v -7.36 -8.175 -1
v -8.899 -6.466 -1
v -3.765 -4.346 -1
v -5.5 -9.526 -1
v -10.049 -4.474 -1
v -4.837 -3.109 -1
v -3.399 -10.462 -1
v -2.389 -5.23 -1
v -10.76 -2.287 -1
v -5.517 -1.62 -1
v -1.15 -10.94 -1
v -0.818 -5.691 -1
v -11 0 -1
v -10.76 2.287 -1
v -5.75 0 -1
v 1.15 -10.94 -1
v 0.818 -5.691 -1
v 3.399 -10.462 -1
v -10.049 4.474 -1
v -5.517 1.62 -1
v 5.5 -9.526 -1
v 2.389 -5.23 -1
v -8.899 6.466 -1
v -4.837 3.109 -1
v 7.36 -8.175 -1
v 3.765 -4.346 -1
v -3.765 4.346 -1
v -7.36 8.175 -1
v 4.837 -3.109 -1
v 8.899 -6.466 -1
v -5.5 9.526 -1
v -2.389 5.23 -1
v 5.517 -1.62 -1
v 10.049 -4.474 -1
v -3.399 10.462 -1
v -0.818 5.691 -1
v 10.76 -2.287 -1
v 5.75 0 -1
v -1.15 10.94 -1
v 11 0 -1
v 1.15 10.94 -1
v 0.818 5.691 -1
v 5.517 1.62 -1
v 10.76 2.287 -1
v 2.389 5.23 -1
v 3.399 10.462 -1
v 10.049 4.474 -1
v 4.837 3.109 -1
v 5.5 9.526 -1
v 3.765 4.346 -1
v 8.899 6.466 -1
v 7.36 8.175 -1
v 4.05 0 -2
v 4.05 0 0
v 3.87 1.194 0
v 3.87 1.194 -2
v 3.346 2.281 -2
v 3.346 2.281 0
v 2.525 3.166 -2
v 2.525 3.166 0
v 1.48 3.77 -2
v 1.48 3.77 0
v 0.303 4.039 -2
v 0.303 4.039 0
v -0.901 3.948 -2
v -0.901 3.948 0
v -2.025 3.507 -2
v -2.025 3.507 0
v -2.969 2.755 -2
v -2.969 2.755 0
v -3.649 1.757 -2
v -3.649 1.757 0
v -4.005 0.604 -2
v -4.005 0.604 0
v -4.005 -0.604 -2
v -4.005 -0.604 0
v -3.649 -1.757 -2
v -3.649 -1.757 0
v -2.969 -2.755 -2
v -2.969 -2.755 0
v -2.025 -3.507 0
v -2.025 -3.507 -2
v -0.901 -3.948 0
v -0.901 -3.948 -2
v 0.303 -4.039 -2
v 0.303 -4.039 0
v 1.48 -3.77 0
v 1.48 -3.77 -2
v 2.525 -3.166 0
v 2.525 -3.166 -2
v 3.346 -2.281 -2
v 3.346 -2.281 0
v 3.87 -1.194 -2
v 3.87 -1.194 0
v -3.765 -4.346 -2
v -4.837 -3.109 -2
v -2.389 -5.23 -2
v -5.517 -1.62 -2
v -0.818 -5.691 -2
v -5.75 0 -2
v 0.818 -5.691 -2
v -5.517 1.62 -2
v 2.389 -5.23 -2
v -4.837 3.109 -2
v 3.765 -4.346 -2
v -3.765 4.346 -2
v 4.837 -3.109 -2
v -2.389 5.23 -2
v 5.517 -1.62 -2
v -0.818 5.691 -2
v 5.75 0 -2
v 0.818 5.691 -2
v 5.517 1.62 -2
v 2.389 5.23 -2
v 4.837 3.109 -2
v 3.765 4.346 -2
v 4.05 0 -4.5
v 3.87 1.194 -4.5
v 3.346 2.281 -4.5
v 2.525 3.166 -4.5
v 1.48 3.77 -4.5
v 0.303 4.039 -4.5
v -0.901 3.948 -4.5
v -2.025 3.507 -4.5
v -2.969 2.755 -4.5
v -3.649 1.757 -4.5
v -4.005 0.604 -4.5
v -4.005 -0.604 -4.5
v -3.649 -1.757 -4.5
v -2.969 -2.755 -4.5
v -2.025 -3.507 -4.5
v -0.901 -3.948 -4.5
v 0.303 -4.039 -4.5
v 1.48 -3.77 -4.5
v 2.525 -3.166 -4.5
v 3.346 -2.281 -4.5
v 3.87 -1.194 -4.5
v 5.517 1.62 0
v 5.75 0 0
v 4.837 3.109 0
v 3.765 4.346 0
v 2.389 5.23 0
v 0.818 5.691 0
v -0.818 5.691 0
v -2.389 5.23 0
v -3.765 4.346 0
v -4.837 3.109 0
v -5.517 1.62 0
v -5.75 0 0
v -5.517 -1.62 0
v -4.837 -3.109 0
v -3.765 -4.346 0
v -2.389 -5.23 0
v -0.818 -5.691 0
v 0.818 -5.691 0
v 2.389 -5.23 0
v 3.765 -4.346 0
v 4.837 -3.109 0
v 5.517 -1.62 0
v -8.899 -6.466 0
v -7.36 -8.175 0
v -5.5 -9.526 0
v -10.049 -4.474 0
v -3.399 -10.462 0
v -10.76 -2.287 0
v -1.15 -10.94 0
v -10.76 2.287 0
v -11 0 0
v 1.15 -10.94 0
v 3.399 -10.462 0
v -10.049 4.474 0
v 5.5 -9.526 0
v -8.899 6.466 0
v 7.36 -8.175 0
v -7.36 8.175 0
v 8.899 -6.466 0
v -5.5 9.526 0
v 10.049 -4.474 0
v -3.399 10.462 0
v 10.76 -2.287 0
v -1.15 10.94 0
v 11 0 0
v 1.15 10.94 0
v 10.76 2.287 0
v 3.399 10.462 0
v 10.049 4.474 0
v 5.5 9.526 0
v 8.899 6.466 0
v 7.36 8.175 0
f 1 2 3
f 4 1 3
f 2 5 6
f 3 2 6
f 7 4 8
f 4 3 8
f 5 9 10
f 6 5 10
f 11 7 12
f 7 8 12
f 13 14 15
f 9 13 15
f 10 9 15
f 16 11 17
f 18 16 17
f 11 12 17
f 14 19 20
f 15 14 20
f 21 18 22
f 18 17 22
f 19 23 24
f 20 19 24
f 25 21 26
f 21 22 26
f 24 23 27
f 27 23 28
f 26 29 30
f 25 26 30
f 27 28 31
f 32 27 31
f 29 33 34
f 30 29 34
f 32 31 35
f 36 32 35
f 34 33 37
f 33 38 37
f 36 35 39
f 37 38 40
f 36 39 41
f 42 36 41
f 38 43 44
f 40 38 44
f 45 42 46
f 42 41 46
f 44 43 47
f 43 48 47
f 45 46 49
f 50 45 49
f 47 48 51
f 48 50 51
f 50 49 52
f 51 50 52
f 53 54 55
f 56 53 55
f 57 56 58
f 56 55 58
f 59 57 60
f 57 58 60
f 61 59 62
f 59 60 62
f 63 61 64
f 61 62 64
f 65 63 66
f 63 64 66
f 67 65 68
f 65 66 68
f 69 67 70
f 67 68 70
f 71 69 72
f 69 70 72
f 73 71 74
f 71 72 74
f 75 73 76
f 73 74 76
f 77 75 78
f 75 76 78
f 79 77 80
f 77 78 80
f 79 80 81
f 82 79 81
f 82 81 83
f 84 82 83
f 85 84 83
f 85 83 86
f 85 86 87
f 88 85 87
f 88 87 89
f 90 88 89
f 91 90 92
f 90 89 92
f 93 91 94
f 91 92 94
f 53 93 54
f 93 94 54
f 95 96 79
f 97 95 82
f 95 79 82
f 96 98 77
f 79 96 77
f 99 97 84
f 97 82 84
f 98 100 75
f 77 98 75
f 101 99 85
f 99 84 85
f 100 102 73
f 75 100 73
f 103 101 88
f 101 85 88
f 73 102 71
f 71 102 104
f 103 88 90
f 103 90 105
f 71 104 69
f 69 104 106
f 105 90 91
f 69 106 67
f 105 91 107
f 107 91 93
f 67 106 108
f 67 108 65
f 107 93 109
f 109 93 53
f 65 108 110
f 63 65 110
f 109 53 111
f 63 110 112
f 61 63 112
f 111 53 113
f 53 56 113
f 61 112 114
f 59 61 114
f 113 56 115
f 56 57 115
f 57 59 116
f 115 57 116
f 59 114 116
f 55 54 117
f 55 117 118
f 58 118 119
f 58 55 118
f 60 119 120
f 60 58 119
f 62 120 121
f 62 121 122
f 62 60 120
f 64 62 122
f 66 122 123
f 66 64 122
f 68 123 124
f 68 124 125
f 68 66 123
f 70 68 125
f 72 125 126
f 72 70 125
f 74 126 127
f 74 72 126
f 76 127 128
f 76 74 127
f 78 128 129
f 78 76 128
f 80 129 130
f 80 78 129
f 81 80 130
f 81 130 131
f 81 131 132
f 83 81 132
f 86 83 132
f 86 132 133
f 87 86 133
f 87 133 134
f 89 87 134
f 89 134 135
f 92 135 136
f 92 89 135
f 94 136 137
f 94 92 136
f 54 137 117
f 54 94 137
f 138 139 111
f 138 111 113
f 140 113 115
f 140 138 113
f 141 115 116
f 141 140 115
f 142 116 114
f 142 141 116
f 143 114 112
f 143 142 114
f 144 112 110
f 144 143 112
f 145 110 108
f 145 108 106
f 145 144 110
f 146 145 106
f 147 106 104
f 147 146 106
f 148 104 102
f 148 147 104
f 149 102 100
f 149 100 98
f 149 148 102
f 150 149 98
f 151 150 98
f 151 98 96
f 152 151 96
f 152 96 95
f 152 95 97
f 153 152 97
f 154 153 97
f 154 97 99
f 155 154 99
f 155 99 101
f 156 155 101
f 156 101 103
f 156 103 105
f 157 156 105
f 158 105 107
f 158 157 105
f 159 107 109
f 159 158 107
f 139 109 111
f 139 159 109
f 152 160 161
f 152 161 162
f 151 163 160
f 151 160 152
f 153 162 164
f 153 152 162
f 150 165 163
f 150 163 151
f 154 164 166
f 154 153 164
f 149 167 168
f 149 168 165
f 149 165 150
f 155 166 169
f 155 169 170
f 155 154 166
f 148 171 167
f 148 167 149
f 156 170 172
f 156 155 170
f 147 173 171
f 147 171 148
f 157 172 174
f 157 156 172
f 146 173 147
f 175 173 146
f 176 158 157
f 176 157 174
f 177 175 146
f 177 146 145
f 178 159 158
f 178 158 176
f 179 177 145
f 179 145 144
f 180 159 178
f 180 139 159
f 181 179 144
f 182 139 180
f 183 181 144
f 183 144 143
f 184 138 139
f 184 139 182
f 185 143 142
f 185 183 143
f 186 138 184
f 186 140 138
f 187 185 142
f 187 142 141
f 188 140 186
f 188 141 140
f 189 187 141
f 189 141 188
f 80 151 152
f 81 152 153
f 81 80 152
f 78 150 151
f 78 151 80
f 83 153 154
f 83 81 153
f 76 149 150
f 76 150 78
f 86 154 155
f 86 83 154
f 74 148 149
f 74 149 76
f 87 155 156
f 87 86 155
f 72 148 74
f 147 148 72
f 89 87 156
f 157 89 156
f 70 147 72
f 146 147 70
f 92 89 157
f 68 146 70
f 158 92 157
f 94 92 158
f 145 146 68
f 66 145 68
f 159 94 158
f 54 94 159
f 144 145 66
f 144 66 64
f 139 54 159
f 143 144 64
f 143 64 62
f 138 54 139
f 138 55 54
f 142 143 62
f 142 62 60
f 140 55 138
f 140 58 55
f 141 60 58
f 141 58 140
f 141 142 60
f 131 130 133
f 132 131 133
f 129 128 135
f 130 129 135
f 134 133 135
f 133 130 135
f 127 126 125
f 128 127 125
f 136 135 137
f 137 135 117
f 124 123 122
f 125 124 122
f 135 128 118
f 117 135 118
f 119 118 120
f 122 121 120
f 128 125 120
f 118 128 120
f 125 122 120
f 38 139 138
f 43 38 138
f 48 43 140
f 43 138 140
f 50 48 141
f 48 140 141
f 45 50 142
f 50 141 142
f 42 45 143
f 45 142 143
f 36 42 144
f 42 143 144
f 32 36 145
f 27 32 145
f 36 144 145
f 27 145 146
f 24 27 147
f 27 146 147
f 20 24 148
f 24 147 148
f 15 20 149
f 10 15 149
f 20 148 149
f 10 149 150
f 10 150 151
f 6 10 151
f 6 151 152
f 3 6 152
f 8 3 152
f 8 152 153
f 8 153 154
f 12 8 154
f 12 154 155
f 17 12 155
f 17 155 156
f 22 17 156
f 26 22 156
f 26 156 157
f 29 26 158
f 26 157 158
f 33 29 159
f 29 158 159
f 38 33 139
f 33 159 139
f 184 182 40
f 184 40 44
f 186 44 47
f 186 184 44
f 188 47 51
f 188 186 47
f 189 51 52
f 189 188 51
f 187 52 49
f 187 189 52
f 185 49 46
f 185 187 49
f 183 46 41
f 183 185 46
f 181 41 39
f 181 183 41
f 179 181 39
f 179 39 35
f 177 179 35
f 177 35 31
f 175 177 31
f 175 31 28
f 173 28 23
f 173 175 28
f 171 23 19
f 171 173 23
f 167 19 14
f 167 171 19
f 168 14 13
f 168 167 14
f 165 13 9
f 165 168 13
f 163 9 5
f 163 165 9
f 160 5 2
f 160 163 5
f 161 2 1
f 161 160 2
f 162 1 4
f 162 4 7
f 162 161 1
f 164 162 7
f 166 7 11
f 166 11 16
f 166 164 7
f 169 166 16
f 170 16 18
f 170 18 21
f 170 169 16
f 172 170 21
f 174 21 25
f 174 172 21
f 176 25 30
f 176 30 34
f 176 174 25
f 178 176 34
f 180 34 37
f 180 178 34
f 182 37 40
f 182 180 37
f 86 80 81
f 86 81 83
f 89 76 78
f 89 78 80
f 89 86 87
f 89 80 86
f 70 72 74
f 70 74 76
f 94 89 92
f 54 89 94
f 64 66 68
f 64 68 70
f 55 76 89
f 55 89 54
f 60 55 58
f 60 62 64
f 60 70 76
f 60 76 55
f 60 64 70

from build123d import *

# Parameters (mm, degrees)
F0_R     = 5.75
F0_R_2   = 4.05
F1_DEPTH = 2
F0_R_3   = 11
F2_DEPTH = 1
F3_DEPTH = 4.5


with BuildPart() as f1:
    # F0 (on Top) → F1 (new body)
    with BuildSketch(Plane.XY):
        Circle(F0_R)
        Circle(F0_R_2, mode=Mode.SUBTRACT)
    extrude(amount=-F1_DEPTH)


with BuildPart() as f2:
    # F0 (on Top) → F2 (new body)
    with BuildSketch(Plane.XY):
        Circle(F0_R_3)
        Circle(F0_R, mode=Mode.SUBTRACT)
    extrude(amount=-F2_DEPTH)


with BuildPart() as f3:
    # F0 (on Top) → F3 (new body)
    with BuildSketch(Plane.XY):
        Circle(F0_R_2)
    extrude(amount=-F3_DEPTH)


solid = Compound([f1.part, f2.part, f3.part])
